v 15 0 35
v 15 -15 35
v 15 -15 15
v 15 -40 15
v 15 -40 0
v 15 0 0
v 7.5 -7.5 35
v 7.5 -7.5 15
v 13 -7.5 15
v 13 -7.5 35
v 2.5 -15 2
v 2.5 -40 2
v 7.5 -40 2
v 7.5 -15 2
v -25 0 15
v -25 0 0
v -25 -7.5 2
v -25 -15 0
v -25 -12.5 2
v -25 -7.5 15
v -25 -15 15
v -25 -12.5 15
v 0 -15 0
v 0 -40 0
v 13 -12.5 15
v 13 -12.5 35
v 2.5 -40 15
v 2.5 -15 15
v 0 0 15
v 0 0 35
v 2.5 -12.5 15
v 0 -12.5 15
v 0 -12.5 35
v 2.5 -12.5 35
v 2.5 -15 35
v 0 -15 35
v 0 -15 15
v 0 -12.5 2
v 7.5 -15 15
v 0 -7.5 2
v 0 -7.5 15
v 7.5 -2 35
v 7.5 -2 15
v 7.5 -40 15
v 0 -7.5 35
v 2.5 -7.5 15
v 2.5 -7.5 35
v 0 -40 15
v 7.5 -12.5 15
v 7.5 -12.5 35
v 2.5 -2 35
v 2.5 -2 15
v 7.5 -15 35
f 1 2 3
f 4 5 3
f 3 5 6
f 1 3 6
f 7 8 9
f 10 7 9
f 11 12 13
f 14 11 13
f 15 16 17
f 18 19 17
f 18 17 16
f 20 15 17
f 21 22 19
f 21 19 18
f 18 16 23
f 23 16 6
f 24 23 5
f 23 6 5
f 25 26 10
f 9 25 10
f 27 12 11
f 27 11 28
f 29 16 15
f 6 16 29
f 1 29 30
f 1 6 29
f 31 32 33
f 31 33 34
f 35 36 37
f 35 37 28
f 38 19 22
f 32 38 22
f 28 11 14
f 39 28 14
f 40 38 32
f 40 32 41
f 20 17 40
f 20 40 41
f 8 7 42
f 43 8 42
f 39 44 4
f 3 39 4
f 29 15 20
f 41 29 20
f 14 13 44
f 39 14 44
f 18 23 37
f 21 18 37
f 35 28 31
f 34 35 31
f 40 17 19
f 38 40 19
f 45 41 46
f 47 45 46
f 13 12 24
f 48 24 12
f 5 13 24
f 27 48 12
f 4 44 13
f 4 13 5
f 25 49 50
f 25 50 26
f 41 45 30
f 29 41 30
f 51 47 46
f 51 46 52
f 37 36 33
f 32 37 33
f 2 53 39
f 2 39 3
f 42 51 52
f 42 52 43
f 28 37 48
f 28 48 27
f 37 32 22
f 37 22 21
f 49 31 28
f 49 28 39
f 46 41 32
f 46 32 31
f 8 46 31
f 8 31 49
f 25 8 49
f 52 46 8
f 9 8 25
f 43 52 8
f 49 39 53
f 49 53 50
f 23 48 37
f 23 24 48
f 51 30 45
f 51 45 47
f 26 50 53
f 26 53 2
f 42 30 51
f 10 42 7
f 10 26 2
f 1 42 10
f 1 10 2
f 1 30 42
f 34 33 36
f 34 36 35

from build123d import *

# Parameters (mm, degrees)
F0_W      = 15
F0_H      = 15
F1_DEPTH  = 25
F2_W      = 15
F2_H      = 15
F3_DEPTH  = 25
F4_DEPTH  = 10
F5_W      = 15
F5_H      = 15
F6_DEPTH  = 25
F7_W      = 5
F7_H      = 13
F8_DEPTH  = 25
F9_W      = 13
F9_H      = 5
F10_DEPTH = 20
F11_W     = 5
F11_H     = 13
F12_DEPTH = 25
F13_W     = 5
F13_H     = 5.5
F13_H_2   = 2.5
F14_DEPTH = 20


with BuildPart() as f1:
    # F0 (on Top) → F1 (new body)
    with BuildSketch(Plane.XY):
        with Locations((7.5, -7.5)):
            Rectangle(F0_W, F0_H)
    extrude(amount=F1_DEPTH)

    # F2 (on face) → F3 (join)
    with BuildSketch(Plane.XZ.offset(15)):
        with Locations((7.5, 7.5)):
            Rectangle(F2_W, F2_H)
    extrude(amount=F3_DEPTH)

    # F4 (add): a face of the model
    f4_faces = [f1.faces().sort_by_distance(p)[0] for p in [
        (7.5, -7.5, 25),
    ]]
    extrude(f4_faces, amount=F4_DEPTH)

    # F5 (on face) → F6 (join)
    with BuildSketch(Plane(origin=(0, 0, 0), x_dir=(0, -1, 0), z_dir=(-1, 0, 0))):
        with Locations((7.5, 7.5)):
            Rectangle(F5_W, F5_H)
    extrude(amount=F6_DEPTH)

    # F7 (on face) → F8 (cut, through all)
    with BuildSketch(Plane(origin=(-25, 0, 0), x_dir=(0, -1, 0), z_dir=(-1, 0, 0))):
        with Locations((10, 8.5)):
            Rectangle(F7_W, F7_H)
    extrude(amount=-F8_DEPTH, mode=Mode.SUBTRACT)

    # F9 (on face) → F10 (cut, through all)
    with BuildSketch(Plane.XY.offset(35)):
        with Locations((6.5, -10)):
            Rectangle(F9_W, F9_H)
    extrude(amount=-F10_DEPTH, mode=Mode.SUBTRACT)

    # F11 (on face) → F12 (cut, through all)
    with BuildSketch(Plane.XZ.offset(40)):
        with Locations((5, 8.5)):
            Rectangle(F11_W, F11_H)
    extrude(amount=-F12_DEPTH, mode=Mode.SUBTRACT)

    # F13 (on face) → F14 (cut, through all)
    with BuildSketch(Plane.XY.offset(35)):
        with Locations((5, -4.75)):
            Rectangle(F13_W, F13_H)
        with Locations((5, -13.75)):
            Rectangle(F13_W, F13_H_2)
    extrude(amount=-F14_DEPTH, mode=Mode.SUBTRACT)


solid = f1.part
